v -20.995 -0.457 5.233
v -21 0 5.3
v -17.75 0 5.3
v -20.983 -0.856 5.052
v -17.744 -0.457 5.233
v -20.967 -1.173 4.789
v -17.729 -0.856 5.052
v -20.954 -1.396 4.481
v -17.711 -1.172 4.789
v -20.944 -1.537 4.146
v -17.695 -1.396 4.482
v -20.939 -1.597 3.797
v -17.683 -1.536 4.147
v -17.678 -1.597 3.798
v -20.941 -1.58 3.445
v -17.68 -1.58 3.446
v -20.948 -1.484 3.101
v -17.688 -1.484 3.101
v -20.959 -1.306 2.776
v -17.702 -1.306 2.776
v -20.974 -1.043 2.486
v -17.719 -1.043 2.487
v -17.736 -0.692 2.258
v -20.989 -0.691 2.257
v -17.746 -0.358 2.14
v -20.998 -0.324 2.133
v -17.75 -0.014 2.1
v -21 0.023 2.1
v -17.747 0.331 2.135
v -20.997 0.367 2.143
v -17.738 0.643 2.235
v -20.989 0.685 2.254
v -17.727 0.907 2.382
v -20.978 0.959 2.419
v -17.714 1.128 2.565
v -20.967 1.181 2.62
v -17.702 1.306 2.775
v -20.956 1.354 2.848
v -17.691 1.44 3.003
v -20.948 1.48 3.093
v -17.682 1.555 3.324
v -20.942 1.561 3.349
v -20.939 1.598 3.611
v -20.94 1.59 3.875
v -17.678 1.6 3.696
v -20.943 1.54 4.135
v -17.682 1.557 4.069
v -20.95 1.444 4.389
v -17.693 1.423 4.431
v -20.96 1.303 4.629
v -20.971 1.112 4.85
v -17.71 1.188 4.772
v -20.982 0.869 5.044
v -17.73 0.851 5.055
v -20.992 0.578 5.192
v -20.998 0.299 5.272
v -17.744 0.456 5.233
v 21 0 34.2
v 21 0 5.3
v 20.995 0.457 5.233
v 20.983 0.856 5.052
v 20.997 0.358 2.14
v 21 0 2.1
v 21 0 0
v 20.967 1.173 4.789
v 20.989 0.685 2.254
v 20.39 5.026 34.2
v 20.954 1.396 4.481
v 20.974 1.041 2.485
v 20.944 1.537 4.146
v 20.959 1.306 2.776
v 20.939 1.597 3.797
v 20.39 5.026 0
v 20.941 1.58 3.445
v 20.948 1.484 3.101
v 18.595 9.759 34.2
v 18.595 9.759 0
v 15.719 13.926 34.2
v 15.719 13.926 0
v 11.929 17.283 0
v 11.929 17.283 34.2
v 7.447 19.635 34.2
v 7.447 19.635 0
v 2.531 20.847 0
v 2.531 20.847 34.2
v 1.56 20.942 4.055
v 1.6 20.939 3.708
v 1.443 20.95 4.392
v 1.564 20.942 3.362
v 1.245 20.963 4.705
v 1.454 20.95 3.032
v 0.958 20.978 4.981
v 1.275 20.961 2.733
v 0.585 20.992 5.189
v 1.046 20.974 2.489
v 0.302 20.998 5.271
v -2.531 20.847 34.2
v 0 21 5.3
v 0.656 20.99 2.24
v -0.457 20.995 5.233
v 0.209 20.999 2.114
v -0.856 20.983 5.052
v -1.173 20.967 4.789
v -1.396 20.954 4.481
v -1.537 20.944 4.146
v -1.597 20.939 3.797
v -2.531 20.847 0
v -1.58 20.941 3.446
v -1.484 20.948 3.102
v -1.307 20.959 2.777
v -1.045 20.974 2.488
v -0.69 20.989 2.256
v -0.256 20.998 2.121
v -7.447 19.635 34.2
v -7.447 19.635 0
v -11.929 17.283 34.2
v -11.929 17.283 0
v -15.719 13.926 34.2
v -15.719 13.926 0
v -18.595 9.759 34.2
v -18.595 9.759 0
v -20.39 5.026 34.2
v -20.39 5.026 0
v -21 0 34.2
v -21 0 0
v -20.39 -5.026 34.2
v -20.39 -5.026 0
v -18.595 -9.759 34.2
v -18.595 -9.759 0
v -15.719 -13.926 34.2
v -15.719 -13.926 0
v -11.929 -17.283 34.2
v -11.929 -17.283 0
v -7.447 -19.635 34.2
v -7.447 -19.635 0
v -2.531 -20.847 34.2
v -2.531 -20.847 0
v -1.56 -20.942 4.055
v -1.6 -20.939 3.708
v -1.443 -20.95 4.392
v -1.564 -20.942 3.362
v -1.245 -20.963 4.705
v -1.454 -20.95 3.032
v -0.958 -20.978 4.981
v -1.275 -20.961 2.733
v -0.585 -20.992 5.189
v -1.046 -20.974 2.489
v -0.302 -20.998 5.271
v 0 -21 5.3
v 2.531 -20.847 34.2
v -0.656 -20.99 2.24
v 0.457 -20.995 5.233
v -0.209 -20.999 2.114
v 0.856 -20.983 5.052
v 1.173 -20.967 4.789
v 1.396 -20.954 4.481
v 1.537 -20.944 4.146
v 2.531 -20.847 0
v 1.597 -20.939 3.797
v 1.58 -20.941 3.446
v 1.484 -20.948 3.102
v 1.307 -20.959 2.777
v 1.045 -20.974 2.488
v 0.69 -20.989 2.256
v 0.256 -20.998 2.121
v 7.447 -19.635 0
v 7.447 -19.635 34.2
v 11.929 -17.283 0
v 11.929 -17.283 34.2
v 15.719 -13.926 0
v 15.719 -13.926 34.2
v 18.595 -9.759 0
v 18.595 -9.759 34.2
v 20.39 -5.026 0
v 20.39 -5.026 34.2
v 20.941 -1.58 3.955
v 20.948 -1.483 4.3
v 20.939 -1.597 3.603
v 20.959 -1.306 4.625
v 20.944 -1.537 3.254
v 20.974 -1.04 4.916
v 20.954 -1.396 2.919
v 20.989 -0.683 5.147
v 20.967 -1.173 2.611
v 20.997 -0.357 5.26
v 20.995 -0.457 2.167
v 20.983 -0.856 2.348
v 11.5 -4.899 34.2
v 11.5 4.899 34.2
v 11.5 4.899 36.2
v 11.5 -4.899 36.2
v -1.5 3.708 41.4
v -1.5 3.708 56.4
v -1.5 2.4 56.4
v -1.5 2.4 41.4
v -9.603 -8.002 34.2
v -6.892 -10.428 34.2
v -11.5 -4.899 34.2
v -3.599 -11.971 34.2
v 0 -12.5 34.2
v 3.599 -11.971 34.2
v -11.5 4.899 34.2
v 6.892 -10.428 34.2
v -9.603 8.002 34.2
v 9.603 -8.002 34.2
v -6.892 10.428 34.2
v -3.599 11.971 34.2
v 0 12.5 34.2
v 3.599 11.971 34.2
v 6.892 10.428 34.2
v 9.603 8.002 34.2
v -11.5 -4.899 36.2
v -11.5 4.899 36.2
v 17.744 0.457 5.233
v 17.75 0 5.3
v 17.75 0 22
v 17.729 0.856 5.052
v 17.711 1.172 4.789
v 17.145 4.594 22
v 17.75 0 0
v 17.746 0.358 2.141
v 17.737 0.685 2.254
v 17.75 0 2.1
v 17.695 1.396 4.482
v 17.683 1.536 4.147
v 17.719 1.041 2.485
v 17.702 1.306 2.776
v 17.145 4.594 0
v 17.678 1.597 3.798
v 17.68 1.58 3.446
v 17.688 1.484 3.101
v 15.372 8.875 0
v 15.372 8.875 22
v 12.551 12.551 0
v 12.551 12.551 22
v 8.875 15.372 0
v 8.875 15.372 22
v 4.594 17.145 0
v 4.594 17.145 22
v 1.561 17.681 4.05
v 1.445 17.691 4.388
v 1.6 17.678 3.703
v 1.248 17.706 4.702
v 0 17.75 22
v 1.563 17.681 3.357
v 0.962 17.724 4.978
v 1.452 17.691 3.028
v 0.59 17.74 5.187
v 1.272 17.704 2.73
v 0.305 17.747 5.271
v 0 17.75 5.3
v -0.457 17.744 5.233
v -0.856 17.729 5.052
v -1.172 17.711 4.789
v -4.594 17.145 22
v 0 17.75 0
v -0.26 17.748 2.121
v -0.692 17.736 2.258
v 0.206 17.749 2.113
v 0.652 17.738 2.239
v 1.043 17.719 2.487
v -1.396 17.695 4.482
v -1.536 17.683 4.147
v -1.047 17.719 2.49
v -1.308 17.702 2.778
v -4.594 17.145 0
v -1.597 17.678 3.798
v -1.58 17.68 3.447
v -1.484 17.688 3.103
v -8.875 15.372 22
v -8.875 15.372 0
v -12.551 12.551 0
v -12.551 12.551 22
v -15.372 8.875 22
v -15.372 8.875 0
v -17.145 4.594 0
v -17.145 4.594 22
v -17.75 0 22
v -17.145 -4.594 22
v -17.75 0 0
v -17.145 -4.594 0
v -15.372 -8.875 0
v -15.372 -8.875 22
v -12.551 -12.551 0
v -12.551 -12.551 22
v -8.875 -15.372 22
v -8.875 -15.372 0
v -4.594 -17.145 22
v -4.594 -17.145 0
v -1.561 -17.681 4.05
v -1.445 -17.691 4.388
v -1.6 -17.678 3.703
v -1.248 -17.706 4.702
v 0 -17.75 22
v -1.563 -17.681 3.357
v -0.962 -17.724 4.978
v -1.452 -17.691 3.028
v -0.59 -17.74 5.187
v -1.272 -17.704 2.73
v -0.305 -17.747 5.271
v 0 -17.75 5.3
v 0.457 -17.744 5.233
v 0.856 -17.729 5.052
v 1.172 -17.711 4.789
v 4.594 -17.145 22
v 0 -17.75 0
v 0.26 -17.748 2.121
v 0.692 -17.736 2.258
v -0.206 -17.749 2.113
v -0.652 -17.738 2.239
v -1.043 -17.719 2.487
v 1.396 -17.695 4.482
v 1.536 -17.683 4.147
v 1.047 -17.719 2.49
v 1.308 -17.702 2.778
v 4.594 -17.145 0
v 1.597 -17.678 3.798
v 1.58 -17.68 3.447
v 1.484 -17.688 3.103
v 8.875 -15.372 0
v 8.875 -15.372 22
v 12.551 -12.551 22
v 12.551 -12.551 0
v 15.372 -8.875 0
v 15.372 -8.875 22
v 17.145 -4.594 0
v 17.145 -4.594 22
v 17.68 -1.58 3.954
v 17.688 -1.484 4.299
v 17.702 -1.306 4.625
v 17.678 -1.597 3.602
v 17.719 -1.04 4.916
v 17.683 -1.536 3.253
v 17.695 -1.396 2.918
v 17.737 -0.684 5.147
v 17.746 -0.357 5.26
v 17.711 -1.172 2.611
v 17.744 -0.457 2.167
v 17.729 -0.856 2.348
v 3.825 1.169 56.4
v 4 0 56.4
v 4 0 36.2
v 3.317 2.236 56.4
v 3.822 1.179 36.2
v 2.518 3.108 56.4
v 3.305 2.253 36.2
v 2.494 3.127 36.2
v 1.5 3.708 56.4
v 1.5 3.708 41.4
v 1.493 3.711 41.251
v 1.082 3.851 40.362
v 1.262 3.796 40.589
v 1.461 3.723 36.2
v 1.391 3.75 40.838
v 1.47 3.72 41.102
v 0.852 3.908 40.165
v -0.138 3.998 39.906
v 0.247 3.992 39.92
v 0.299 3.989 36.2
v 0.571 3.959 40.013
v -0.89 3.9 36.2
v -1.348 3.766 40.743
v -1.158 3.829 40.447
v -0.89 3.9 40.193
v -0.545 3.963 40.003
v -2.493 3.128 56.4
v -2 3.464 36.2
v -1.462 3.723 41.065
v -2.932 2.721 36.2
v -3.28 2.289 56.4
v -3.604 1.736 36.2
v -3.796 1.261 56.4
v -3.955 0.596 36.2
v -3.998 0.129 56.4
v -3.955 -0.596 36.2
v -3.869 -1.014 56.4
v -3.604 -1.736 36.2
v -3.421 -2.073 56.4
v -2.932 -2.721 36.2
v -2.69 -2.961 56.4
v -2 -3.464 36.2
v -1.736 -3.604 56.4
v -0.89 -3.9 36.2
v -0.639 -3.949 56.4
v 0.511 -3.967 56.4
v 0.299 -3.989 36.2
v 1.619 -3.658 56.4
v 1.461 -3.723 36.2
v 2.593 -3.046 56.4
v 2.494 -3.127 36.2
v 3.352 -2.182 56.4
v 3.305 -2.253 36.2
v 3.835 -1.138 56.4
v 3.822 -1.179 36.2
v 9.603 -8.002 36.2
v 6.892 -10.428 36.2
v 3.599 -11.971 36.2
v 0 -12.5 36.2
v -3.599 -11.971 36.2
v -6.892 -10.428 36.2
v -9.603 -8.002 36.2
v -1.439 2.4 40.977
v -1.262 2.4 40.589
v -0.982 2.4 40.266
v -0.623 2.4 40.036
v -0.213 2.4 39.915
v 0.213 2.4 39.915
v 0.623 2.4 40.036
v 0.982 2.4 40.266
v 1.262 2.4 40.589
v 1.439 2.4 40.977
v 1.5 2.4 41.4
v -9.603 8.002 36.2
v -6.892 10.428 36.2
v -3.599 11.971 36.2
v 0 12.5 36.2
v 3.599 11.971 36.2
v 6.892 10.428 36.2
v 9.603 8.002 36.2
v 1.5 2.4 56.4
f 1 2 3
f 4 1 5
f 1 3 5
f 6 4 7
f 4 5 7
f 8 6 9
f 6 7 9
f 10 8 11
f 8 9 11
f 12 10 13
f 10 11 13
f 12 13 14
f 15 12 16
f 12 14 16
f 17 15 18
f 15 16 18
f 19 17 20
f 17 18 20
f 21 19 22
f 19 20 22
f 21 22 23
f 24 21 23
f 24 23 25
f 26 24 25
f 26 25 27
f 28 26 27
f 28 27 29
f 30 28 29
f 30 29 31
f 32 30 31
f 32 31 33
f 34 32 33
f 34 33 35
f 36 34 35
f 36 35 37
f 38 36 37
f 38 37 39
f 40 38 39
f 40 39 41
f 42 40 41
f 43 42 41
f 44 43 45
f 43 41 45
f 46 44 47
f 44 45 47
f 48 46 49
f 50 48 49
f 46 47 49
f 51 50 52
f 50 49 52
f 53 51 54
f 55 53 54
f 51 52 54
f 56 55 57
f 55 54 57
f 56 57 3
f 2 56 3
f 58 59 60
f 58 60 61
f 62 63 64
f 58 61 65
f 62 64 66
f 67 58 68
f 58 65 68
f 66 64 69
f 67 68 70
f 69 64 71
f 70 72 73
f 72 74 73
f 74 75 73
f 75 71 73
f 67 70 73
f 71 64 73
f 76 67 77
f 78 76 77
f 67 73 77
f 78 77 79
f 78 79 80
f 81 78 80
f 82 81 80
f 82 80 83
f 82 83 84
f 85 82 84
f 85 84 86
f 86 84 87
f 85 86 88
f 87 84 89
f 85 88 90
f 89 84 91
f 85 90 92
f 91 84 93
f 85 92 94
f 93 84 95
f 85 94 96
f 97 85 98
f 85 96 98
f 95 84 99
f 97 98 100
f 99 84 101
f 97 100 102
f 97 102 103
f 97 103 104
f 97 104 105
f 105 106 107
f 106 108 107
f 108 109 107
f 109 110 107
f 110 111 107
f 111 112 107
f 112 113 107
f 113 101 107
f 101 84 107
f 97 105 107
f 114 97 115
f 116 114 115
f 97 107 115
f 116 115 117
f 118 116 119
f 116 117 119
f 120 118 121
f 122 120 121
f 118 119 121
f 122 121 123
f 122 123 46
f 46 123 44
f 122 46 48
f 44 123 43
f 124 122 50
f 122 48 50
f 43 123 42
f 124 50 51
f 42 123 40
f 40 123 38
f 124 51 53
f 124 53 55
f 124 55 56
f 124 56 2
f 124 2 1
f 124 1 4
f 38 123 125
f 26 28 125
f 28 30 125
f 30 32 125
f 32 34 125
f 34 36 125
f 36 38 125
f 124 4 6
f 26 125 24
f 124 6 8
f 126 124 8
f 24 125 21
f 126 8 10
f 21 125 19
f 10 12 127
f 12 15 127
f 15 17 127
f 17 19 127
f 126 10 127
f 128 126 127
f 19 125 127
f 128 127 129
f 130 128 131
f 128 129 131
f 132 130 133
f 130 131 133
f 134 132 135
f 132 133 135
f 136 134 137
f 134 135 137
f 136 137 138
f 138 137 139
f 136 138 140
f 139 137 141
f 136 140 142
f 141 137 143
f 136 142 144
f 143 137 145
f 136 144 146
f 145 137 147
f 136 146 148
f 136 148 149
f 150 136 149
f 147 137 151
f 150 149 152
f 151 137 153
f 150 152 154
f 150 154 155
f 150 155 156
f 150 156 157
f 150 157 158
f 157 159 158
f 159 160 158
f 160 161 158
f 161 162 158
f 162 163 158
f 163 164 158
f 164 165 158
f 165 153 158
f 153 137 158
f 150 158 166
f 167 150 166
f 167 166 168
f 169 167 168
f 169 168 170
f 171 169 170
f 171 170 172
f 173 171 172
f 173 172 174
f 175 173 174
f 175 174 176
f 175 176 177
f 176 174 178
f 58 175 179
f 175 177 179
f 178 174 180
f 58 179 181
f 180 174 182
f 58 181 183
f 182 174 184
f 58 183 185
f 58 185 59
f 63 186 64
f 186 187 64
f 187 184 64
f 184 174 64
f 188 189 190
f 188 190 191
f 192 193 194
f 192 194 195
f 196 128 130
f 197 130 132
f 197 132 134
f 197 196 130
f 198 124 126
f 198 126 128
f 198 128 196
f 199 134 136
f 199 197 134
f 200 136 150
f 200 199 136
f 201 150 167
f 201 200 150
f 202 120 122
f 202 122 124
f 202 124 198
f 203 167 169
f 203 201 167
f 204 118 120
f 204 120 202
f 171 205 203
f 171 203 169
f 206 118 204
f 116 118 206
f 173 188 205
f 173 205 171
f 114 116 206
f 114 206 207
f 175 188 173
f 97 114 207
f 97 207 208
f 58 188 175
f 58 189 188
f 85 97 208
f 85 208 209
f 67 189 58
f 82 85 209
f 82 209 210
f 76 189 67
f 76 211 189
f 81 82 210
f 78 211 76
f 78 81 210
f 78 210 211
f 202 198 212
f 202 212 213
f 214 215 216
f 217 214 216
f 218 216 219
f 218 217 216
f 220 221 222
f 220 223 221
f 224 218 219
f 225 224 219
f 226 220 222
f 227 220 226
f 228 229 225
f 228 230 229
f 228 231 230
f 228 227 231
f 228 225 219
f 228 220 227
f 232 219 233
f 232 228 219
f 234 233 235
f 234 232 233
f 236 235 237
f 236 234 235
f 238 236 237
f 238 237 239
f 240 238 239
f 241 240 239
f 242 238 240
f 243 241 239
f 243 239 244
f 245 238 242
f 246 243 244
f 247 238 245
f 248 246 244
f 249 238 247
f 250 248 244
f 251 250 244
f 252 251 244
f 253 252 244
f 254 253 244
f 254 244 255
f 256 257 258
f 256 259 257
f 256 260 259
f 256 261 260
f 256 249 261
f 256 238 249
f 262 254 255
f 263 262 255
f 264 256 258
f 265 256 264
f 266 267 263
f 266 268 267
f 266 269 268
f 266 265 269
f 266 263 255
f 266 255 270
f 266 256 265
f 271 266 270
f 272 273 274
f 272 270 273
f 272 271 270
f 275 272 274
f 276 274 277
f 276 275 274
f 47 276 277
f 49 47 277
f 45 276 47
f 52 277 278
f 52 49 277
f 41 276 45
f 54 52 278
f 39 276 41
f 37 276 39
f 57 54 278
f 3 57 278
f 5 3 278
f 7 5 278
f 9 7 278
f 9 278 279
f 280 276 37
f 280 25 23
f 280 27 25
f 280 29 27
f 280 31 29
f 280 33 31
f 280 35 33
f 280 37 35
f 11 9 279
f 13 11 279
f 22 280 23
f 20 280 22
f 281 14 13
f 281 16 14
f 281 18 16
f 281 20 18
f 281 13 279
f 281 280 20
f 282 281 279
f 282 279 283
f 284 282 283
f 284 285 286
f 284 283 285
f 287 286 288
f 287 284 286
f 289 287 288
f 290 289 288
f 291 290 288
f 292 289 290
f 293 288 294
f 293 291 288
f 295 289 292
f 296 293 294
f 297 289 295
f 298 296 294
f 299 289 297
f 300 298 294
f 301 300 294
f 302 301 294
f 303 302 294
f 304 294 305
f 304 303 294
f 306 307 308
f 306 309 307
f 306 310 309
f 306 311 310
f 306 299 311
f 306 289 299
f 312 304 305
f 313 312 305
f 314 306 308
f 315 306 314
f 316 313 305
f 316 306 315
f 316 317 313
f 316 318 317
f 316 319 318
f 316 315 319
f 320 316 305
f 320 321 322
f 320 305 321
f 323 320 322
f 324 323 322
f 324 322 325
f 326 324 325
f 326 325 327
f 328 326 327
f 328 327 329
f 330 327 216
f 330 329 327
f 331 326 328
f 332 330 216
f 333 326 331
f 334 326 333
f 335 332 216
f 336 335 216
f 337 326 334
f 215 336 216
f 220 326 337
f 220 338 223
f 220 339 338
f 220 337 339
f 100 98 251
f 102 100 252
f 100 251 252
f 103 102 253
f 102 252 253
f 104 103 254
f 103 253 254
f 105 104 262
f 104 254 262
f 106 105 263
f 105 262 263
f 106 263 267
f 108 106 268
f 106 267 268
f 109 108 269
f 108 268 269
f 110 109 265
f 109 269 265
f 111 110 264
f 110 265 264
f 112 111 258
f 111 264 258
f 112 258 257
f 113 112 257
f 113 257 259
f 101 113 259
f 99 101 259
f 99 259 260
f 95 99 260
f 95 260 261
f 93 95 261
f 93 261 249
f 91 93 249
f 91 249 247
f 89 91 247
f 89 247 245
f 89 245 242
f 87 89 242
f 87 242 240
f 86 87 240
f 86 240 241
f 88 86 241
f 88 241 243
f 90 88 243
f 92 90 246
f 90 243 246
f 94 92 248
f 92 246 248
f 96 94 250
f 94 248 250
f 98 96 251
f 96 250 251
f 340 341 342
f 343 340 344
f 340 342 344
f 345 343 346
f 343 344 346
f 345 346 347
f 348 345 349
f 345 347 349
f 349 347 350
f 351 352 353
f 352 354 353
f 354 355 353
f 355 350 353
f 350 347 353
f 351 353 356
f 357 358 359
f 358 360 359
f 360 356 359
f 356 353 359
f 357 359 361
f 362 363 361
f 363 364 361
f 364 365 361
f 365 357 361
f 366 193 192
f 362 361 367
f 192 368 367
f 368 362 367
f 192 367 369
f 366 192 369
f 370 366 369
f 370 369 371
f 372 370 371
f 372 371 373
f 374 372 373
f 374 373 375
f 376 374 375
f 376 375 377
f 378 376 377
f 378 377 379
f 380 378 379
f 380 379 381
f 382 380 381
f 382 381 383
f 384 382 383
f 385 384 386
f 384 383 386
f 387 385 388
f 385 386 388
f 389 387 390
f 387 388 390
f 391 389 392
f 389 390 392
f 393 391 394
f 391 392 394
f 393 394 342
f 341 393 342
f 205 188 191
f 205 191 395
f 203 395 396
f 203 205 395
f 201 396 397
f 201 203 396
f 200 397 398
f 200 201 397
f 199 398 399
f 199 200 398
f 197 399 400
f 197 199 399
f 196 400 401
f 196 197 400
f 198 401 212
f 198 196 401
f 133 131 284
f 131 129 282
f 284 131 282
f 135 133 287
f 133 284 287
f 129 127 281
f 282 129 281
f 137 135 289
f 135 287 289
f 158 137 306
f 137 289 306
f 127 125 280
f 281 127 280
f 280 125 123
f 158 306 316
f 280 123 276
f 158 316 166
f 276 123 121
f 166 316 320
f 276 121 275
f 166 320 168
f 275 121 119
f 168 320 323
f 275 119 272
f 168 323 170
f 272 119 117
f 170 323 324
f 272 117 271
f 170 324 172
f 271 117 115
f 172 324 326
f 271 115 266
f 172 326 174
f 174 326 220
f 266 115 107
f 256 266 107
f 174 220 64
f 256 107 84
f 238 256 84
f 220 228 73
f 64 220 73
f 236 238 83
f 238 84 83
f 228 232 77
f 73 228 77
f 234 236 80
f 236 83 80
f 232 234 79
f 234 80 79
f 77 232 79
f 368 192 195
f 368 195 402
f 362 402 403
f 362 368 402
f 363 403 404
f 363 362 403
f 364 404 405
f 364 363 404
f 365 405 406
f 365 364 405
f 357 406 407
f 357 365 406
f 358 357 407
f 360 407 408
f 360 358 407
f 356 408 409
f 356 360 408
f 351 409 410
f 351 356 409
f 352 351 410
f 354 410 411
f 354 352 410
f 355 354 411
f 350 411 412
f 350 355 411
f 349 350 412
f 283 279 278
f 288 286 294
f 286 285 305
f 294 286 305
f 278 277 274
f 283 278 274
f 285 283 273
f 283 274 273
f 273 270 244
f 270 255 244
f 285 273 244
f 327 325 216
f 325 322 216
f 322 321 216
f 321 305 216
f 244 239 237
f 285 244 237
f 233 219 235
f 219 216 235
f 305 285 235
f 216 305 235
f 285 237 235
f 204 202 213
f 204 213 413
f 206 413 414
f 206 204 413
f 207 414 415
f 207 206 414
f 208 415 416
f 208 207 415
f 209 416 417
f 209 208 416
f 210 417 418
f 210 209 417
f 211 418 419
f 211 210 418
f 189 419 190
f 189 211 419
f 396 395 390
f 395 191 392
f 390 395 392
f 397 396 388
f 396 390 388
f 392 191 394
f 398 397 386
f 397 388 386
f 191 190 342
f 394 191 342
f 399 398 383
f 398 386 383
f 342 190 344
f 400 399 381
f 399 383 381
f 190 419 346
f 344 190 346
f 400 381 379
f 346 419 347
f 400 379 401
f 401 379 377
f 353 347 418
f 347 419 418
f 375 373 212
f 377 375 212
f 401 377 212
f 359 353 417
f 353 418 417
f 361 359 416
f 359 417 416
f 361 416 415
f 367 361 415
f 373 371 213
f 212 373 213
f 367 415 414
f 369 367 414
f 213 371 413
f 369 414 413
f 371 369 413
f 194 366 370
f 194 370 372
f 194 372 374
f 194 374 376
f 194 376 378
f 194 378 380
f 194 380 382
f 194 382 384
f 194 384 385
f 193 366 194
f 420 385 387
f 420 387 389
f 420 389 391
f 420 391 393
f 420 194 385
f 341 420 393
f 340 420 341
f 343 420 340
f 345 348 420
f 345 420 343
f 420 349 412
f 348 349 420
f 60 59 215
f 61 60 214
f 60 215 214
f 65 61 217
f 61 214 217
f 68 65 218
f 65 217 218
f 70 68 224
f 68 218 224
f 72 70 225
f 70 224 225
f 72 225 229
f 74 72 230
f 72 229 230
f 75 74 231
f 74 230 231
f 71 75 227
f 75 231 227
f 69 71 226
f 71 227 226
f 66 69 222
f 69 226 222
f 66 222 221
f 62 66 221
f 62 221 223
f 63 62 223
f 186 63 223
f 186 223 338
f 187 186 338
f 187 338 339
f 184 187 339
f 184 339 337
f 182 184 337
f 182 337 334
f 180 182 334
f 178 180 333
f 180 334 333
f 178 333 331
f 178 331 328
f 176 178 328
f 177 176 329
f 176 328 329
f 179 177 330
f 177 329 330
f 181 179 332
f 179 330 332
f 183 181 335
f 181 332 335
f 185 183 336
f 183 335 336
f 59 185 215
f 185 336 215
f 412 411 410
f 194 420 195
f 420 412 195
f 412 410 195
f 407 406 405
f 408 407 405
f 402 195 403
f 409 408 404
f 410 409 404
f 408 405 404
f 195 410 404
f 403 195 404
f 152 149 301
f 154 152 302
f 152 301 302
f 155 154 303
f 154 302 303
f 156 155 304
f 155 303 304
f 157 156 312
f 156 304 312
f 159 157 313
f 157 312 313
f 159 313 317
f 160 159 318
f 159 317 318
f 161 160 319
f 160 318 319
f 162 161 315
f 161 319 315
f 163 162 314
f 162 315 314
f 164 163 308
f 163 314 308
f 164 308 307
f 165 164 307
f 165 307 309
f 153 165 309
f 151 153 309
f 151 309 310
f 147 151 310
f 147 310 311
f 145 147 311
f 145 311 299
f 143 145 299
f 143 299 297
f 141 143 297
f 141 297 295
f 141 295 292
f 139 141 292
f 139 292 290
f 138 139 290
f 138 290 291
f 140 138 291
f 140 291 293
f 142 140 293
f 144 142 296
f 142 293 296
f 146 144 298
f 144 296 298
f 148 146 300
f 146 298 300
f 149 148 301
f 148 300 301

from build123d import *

# Parameters (mm, degrees)
SKETCH_1_R               = 21
SKETCH_1_R_2             = 17.75
EXTRUDE_1_DEPTH          = 34.2
EXTRUDE_START            = -12.2
SKETCH_2_R               = 21
EXTRUDE_2_DEPTH          = 12.2
EXTRUDE_3_DEPTH          = 2
SKETCH_4_R               = 4
EXTRUDE_4_DEPTH          = 20.2
SKETCH_5_R               = 1.6
CUT_EXTRUDE_1_DEPTH      = 64.741352355
PATTERN_CIRCULAR_1_COUNT = 4
CUT_EXTRUDE_2_DEPTH      = 1.6


with BuildPart() as part:
    # ｽｹｯﾁ1 → ﾎﾞｽ - 押し出し1 (new body)
    with BuildSketch(Plane.XY):
        Circle(SKETCH_1_R)
        Circle(SKETCH_1_R_2, mode=Mode.SUBTRACT)
    extrude(amount=EXTRUDE_1_DEPTH)

    # ｽｹｯﾁ2 → ﾎﾞｽ - 押し出し2 (add)
    with BuildSketch(Plane.XY.offset(34.2).offset(EXTRUDE_START)):
        Circle(SKETCH_2_R)
    extrude(amount=EXTRUDE_2_DEPTH)

    # ｽｹｯﾁ3 → ﾎﾞｽ - 押し出し3 (add)
    with BuildSketch(Plane.XY.offset(34.2)):
        with BuildLine():
            Line((-11.5, -4.898979486), (-11.5, 4.898979486))
            ThreePointArc((-11.5, 4.898979486), (0, 12.5), (11.5, 4.898979486))
            Line((11.5, 4.898979486), (11.5, -4.898979486))
            ThreePointArc((11.5, -4.898979486), (0, -12.5), (-11.5, -4.898979486))
        make_face()
    extrude(amount=EXTRUDE_3_DEPTH)

    # ｽｹｯﾁ4 → ﾎﾞｽ - 押し出し4 (add)
    with BuildSketch(Plane.XY.offset(36.2)):
        Circle(SKETCH_4_R)
    extrude(amount=EXTRUDE_4_DEPTH)

    # ｽｹｯﾁ5 → ｶｯﾄ - 押し出し1 (cut, through all)
    with BuildSketch(Plane(origin=(0, 0, 0), x_dir=(1, 0, 0), z_dir=(0, 1, 0))):
        with Locations(Location((0, -3.7, 0), (0, 0, 270))):
            Circle(SKETCH_5_R)
    cut_extrude_1 = extrude(amount=-CUT_EXTRUDE_1_DEPTH, mode=Mode.SUBTRACT)

    # 円形ﾊﾟﾀｰﾝ1: ｶｯﾄ - 押し出し1 ×4 about axis
    pattern_circular_1_axis = Axis((0, 0, 34.2), (0, 0, -1))
    for i in range(1, PATTERN_CIRCULAR_1_COUNT):
        add(cut_extrude_1.rotate(pattern_circular_1_axis, i * 360 / PATTERN_CIRCULAR_1_COUNT), mode=Mode.SUBTRACT)

    # ｽｹｯﾁ7 → ｶｯﾄ - 押し出し2 (cut)
    with BuildSketch(Plane(origin=(0, 4, 0), x_dir=(1, 0, 0), z_dir=(0, 1, 0))):
        with BuildLine():
            Line((-1.5, -56.4), (-1.5, -41.4))
            ThreePointArc((-1.5, -41.4), (0, -39.9), (1.5, -41.4))
            Line((1.5, -41.4), (1.5, -56.4))
            ThreePointArc((1.5, -56.4), (0, -57.9), (-1.5, -56.4))
        make_face()
    extrude(amount=-CUT_EXTRUDE_2_DEPTH, mode=Mode.SUBTRACT)


solid = part.part
